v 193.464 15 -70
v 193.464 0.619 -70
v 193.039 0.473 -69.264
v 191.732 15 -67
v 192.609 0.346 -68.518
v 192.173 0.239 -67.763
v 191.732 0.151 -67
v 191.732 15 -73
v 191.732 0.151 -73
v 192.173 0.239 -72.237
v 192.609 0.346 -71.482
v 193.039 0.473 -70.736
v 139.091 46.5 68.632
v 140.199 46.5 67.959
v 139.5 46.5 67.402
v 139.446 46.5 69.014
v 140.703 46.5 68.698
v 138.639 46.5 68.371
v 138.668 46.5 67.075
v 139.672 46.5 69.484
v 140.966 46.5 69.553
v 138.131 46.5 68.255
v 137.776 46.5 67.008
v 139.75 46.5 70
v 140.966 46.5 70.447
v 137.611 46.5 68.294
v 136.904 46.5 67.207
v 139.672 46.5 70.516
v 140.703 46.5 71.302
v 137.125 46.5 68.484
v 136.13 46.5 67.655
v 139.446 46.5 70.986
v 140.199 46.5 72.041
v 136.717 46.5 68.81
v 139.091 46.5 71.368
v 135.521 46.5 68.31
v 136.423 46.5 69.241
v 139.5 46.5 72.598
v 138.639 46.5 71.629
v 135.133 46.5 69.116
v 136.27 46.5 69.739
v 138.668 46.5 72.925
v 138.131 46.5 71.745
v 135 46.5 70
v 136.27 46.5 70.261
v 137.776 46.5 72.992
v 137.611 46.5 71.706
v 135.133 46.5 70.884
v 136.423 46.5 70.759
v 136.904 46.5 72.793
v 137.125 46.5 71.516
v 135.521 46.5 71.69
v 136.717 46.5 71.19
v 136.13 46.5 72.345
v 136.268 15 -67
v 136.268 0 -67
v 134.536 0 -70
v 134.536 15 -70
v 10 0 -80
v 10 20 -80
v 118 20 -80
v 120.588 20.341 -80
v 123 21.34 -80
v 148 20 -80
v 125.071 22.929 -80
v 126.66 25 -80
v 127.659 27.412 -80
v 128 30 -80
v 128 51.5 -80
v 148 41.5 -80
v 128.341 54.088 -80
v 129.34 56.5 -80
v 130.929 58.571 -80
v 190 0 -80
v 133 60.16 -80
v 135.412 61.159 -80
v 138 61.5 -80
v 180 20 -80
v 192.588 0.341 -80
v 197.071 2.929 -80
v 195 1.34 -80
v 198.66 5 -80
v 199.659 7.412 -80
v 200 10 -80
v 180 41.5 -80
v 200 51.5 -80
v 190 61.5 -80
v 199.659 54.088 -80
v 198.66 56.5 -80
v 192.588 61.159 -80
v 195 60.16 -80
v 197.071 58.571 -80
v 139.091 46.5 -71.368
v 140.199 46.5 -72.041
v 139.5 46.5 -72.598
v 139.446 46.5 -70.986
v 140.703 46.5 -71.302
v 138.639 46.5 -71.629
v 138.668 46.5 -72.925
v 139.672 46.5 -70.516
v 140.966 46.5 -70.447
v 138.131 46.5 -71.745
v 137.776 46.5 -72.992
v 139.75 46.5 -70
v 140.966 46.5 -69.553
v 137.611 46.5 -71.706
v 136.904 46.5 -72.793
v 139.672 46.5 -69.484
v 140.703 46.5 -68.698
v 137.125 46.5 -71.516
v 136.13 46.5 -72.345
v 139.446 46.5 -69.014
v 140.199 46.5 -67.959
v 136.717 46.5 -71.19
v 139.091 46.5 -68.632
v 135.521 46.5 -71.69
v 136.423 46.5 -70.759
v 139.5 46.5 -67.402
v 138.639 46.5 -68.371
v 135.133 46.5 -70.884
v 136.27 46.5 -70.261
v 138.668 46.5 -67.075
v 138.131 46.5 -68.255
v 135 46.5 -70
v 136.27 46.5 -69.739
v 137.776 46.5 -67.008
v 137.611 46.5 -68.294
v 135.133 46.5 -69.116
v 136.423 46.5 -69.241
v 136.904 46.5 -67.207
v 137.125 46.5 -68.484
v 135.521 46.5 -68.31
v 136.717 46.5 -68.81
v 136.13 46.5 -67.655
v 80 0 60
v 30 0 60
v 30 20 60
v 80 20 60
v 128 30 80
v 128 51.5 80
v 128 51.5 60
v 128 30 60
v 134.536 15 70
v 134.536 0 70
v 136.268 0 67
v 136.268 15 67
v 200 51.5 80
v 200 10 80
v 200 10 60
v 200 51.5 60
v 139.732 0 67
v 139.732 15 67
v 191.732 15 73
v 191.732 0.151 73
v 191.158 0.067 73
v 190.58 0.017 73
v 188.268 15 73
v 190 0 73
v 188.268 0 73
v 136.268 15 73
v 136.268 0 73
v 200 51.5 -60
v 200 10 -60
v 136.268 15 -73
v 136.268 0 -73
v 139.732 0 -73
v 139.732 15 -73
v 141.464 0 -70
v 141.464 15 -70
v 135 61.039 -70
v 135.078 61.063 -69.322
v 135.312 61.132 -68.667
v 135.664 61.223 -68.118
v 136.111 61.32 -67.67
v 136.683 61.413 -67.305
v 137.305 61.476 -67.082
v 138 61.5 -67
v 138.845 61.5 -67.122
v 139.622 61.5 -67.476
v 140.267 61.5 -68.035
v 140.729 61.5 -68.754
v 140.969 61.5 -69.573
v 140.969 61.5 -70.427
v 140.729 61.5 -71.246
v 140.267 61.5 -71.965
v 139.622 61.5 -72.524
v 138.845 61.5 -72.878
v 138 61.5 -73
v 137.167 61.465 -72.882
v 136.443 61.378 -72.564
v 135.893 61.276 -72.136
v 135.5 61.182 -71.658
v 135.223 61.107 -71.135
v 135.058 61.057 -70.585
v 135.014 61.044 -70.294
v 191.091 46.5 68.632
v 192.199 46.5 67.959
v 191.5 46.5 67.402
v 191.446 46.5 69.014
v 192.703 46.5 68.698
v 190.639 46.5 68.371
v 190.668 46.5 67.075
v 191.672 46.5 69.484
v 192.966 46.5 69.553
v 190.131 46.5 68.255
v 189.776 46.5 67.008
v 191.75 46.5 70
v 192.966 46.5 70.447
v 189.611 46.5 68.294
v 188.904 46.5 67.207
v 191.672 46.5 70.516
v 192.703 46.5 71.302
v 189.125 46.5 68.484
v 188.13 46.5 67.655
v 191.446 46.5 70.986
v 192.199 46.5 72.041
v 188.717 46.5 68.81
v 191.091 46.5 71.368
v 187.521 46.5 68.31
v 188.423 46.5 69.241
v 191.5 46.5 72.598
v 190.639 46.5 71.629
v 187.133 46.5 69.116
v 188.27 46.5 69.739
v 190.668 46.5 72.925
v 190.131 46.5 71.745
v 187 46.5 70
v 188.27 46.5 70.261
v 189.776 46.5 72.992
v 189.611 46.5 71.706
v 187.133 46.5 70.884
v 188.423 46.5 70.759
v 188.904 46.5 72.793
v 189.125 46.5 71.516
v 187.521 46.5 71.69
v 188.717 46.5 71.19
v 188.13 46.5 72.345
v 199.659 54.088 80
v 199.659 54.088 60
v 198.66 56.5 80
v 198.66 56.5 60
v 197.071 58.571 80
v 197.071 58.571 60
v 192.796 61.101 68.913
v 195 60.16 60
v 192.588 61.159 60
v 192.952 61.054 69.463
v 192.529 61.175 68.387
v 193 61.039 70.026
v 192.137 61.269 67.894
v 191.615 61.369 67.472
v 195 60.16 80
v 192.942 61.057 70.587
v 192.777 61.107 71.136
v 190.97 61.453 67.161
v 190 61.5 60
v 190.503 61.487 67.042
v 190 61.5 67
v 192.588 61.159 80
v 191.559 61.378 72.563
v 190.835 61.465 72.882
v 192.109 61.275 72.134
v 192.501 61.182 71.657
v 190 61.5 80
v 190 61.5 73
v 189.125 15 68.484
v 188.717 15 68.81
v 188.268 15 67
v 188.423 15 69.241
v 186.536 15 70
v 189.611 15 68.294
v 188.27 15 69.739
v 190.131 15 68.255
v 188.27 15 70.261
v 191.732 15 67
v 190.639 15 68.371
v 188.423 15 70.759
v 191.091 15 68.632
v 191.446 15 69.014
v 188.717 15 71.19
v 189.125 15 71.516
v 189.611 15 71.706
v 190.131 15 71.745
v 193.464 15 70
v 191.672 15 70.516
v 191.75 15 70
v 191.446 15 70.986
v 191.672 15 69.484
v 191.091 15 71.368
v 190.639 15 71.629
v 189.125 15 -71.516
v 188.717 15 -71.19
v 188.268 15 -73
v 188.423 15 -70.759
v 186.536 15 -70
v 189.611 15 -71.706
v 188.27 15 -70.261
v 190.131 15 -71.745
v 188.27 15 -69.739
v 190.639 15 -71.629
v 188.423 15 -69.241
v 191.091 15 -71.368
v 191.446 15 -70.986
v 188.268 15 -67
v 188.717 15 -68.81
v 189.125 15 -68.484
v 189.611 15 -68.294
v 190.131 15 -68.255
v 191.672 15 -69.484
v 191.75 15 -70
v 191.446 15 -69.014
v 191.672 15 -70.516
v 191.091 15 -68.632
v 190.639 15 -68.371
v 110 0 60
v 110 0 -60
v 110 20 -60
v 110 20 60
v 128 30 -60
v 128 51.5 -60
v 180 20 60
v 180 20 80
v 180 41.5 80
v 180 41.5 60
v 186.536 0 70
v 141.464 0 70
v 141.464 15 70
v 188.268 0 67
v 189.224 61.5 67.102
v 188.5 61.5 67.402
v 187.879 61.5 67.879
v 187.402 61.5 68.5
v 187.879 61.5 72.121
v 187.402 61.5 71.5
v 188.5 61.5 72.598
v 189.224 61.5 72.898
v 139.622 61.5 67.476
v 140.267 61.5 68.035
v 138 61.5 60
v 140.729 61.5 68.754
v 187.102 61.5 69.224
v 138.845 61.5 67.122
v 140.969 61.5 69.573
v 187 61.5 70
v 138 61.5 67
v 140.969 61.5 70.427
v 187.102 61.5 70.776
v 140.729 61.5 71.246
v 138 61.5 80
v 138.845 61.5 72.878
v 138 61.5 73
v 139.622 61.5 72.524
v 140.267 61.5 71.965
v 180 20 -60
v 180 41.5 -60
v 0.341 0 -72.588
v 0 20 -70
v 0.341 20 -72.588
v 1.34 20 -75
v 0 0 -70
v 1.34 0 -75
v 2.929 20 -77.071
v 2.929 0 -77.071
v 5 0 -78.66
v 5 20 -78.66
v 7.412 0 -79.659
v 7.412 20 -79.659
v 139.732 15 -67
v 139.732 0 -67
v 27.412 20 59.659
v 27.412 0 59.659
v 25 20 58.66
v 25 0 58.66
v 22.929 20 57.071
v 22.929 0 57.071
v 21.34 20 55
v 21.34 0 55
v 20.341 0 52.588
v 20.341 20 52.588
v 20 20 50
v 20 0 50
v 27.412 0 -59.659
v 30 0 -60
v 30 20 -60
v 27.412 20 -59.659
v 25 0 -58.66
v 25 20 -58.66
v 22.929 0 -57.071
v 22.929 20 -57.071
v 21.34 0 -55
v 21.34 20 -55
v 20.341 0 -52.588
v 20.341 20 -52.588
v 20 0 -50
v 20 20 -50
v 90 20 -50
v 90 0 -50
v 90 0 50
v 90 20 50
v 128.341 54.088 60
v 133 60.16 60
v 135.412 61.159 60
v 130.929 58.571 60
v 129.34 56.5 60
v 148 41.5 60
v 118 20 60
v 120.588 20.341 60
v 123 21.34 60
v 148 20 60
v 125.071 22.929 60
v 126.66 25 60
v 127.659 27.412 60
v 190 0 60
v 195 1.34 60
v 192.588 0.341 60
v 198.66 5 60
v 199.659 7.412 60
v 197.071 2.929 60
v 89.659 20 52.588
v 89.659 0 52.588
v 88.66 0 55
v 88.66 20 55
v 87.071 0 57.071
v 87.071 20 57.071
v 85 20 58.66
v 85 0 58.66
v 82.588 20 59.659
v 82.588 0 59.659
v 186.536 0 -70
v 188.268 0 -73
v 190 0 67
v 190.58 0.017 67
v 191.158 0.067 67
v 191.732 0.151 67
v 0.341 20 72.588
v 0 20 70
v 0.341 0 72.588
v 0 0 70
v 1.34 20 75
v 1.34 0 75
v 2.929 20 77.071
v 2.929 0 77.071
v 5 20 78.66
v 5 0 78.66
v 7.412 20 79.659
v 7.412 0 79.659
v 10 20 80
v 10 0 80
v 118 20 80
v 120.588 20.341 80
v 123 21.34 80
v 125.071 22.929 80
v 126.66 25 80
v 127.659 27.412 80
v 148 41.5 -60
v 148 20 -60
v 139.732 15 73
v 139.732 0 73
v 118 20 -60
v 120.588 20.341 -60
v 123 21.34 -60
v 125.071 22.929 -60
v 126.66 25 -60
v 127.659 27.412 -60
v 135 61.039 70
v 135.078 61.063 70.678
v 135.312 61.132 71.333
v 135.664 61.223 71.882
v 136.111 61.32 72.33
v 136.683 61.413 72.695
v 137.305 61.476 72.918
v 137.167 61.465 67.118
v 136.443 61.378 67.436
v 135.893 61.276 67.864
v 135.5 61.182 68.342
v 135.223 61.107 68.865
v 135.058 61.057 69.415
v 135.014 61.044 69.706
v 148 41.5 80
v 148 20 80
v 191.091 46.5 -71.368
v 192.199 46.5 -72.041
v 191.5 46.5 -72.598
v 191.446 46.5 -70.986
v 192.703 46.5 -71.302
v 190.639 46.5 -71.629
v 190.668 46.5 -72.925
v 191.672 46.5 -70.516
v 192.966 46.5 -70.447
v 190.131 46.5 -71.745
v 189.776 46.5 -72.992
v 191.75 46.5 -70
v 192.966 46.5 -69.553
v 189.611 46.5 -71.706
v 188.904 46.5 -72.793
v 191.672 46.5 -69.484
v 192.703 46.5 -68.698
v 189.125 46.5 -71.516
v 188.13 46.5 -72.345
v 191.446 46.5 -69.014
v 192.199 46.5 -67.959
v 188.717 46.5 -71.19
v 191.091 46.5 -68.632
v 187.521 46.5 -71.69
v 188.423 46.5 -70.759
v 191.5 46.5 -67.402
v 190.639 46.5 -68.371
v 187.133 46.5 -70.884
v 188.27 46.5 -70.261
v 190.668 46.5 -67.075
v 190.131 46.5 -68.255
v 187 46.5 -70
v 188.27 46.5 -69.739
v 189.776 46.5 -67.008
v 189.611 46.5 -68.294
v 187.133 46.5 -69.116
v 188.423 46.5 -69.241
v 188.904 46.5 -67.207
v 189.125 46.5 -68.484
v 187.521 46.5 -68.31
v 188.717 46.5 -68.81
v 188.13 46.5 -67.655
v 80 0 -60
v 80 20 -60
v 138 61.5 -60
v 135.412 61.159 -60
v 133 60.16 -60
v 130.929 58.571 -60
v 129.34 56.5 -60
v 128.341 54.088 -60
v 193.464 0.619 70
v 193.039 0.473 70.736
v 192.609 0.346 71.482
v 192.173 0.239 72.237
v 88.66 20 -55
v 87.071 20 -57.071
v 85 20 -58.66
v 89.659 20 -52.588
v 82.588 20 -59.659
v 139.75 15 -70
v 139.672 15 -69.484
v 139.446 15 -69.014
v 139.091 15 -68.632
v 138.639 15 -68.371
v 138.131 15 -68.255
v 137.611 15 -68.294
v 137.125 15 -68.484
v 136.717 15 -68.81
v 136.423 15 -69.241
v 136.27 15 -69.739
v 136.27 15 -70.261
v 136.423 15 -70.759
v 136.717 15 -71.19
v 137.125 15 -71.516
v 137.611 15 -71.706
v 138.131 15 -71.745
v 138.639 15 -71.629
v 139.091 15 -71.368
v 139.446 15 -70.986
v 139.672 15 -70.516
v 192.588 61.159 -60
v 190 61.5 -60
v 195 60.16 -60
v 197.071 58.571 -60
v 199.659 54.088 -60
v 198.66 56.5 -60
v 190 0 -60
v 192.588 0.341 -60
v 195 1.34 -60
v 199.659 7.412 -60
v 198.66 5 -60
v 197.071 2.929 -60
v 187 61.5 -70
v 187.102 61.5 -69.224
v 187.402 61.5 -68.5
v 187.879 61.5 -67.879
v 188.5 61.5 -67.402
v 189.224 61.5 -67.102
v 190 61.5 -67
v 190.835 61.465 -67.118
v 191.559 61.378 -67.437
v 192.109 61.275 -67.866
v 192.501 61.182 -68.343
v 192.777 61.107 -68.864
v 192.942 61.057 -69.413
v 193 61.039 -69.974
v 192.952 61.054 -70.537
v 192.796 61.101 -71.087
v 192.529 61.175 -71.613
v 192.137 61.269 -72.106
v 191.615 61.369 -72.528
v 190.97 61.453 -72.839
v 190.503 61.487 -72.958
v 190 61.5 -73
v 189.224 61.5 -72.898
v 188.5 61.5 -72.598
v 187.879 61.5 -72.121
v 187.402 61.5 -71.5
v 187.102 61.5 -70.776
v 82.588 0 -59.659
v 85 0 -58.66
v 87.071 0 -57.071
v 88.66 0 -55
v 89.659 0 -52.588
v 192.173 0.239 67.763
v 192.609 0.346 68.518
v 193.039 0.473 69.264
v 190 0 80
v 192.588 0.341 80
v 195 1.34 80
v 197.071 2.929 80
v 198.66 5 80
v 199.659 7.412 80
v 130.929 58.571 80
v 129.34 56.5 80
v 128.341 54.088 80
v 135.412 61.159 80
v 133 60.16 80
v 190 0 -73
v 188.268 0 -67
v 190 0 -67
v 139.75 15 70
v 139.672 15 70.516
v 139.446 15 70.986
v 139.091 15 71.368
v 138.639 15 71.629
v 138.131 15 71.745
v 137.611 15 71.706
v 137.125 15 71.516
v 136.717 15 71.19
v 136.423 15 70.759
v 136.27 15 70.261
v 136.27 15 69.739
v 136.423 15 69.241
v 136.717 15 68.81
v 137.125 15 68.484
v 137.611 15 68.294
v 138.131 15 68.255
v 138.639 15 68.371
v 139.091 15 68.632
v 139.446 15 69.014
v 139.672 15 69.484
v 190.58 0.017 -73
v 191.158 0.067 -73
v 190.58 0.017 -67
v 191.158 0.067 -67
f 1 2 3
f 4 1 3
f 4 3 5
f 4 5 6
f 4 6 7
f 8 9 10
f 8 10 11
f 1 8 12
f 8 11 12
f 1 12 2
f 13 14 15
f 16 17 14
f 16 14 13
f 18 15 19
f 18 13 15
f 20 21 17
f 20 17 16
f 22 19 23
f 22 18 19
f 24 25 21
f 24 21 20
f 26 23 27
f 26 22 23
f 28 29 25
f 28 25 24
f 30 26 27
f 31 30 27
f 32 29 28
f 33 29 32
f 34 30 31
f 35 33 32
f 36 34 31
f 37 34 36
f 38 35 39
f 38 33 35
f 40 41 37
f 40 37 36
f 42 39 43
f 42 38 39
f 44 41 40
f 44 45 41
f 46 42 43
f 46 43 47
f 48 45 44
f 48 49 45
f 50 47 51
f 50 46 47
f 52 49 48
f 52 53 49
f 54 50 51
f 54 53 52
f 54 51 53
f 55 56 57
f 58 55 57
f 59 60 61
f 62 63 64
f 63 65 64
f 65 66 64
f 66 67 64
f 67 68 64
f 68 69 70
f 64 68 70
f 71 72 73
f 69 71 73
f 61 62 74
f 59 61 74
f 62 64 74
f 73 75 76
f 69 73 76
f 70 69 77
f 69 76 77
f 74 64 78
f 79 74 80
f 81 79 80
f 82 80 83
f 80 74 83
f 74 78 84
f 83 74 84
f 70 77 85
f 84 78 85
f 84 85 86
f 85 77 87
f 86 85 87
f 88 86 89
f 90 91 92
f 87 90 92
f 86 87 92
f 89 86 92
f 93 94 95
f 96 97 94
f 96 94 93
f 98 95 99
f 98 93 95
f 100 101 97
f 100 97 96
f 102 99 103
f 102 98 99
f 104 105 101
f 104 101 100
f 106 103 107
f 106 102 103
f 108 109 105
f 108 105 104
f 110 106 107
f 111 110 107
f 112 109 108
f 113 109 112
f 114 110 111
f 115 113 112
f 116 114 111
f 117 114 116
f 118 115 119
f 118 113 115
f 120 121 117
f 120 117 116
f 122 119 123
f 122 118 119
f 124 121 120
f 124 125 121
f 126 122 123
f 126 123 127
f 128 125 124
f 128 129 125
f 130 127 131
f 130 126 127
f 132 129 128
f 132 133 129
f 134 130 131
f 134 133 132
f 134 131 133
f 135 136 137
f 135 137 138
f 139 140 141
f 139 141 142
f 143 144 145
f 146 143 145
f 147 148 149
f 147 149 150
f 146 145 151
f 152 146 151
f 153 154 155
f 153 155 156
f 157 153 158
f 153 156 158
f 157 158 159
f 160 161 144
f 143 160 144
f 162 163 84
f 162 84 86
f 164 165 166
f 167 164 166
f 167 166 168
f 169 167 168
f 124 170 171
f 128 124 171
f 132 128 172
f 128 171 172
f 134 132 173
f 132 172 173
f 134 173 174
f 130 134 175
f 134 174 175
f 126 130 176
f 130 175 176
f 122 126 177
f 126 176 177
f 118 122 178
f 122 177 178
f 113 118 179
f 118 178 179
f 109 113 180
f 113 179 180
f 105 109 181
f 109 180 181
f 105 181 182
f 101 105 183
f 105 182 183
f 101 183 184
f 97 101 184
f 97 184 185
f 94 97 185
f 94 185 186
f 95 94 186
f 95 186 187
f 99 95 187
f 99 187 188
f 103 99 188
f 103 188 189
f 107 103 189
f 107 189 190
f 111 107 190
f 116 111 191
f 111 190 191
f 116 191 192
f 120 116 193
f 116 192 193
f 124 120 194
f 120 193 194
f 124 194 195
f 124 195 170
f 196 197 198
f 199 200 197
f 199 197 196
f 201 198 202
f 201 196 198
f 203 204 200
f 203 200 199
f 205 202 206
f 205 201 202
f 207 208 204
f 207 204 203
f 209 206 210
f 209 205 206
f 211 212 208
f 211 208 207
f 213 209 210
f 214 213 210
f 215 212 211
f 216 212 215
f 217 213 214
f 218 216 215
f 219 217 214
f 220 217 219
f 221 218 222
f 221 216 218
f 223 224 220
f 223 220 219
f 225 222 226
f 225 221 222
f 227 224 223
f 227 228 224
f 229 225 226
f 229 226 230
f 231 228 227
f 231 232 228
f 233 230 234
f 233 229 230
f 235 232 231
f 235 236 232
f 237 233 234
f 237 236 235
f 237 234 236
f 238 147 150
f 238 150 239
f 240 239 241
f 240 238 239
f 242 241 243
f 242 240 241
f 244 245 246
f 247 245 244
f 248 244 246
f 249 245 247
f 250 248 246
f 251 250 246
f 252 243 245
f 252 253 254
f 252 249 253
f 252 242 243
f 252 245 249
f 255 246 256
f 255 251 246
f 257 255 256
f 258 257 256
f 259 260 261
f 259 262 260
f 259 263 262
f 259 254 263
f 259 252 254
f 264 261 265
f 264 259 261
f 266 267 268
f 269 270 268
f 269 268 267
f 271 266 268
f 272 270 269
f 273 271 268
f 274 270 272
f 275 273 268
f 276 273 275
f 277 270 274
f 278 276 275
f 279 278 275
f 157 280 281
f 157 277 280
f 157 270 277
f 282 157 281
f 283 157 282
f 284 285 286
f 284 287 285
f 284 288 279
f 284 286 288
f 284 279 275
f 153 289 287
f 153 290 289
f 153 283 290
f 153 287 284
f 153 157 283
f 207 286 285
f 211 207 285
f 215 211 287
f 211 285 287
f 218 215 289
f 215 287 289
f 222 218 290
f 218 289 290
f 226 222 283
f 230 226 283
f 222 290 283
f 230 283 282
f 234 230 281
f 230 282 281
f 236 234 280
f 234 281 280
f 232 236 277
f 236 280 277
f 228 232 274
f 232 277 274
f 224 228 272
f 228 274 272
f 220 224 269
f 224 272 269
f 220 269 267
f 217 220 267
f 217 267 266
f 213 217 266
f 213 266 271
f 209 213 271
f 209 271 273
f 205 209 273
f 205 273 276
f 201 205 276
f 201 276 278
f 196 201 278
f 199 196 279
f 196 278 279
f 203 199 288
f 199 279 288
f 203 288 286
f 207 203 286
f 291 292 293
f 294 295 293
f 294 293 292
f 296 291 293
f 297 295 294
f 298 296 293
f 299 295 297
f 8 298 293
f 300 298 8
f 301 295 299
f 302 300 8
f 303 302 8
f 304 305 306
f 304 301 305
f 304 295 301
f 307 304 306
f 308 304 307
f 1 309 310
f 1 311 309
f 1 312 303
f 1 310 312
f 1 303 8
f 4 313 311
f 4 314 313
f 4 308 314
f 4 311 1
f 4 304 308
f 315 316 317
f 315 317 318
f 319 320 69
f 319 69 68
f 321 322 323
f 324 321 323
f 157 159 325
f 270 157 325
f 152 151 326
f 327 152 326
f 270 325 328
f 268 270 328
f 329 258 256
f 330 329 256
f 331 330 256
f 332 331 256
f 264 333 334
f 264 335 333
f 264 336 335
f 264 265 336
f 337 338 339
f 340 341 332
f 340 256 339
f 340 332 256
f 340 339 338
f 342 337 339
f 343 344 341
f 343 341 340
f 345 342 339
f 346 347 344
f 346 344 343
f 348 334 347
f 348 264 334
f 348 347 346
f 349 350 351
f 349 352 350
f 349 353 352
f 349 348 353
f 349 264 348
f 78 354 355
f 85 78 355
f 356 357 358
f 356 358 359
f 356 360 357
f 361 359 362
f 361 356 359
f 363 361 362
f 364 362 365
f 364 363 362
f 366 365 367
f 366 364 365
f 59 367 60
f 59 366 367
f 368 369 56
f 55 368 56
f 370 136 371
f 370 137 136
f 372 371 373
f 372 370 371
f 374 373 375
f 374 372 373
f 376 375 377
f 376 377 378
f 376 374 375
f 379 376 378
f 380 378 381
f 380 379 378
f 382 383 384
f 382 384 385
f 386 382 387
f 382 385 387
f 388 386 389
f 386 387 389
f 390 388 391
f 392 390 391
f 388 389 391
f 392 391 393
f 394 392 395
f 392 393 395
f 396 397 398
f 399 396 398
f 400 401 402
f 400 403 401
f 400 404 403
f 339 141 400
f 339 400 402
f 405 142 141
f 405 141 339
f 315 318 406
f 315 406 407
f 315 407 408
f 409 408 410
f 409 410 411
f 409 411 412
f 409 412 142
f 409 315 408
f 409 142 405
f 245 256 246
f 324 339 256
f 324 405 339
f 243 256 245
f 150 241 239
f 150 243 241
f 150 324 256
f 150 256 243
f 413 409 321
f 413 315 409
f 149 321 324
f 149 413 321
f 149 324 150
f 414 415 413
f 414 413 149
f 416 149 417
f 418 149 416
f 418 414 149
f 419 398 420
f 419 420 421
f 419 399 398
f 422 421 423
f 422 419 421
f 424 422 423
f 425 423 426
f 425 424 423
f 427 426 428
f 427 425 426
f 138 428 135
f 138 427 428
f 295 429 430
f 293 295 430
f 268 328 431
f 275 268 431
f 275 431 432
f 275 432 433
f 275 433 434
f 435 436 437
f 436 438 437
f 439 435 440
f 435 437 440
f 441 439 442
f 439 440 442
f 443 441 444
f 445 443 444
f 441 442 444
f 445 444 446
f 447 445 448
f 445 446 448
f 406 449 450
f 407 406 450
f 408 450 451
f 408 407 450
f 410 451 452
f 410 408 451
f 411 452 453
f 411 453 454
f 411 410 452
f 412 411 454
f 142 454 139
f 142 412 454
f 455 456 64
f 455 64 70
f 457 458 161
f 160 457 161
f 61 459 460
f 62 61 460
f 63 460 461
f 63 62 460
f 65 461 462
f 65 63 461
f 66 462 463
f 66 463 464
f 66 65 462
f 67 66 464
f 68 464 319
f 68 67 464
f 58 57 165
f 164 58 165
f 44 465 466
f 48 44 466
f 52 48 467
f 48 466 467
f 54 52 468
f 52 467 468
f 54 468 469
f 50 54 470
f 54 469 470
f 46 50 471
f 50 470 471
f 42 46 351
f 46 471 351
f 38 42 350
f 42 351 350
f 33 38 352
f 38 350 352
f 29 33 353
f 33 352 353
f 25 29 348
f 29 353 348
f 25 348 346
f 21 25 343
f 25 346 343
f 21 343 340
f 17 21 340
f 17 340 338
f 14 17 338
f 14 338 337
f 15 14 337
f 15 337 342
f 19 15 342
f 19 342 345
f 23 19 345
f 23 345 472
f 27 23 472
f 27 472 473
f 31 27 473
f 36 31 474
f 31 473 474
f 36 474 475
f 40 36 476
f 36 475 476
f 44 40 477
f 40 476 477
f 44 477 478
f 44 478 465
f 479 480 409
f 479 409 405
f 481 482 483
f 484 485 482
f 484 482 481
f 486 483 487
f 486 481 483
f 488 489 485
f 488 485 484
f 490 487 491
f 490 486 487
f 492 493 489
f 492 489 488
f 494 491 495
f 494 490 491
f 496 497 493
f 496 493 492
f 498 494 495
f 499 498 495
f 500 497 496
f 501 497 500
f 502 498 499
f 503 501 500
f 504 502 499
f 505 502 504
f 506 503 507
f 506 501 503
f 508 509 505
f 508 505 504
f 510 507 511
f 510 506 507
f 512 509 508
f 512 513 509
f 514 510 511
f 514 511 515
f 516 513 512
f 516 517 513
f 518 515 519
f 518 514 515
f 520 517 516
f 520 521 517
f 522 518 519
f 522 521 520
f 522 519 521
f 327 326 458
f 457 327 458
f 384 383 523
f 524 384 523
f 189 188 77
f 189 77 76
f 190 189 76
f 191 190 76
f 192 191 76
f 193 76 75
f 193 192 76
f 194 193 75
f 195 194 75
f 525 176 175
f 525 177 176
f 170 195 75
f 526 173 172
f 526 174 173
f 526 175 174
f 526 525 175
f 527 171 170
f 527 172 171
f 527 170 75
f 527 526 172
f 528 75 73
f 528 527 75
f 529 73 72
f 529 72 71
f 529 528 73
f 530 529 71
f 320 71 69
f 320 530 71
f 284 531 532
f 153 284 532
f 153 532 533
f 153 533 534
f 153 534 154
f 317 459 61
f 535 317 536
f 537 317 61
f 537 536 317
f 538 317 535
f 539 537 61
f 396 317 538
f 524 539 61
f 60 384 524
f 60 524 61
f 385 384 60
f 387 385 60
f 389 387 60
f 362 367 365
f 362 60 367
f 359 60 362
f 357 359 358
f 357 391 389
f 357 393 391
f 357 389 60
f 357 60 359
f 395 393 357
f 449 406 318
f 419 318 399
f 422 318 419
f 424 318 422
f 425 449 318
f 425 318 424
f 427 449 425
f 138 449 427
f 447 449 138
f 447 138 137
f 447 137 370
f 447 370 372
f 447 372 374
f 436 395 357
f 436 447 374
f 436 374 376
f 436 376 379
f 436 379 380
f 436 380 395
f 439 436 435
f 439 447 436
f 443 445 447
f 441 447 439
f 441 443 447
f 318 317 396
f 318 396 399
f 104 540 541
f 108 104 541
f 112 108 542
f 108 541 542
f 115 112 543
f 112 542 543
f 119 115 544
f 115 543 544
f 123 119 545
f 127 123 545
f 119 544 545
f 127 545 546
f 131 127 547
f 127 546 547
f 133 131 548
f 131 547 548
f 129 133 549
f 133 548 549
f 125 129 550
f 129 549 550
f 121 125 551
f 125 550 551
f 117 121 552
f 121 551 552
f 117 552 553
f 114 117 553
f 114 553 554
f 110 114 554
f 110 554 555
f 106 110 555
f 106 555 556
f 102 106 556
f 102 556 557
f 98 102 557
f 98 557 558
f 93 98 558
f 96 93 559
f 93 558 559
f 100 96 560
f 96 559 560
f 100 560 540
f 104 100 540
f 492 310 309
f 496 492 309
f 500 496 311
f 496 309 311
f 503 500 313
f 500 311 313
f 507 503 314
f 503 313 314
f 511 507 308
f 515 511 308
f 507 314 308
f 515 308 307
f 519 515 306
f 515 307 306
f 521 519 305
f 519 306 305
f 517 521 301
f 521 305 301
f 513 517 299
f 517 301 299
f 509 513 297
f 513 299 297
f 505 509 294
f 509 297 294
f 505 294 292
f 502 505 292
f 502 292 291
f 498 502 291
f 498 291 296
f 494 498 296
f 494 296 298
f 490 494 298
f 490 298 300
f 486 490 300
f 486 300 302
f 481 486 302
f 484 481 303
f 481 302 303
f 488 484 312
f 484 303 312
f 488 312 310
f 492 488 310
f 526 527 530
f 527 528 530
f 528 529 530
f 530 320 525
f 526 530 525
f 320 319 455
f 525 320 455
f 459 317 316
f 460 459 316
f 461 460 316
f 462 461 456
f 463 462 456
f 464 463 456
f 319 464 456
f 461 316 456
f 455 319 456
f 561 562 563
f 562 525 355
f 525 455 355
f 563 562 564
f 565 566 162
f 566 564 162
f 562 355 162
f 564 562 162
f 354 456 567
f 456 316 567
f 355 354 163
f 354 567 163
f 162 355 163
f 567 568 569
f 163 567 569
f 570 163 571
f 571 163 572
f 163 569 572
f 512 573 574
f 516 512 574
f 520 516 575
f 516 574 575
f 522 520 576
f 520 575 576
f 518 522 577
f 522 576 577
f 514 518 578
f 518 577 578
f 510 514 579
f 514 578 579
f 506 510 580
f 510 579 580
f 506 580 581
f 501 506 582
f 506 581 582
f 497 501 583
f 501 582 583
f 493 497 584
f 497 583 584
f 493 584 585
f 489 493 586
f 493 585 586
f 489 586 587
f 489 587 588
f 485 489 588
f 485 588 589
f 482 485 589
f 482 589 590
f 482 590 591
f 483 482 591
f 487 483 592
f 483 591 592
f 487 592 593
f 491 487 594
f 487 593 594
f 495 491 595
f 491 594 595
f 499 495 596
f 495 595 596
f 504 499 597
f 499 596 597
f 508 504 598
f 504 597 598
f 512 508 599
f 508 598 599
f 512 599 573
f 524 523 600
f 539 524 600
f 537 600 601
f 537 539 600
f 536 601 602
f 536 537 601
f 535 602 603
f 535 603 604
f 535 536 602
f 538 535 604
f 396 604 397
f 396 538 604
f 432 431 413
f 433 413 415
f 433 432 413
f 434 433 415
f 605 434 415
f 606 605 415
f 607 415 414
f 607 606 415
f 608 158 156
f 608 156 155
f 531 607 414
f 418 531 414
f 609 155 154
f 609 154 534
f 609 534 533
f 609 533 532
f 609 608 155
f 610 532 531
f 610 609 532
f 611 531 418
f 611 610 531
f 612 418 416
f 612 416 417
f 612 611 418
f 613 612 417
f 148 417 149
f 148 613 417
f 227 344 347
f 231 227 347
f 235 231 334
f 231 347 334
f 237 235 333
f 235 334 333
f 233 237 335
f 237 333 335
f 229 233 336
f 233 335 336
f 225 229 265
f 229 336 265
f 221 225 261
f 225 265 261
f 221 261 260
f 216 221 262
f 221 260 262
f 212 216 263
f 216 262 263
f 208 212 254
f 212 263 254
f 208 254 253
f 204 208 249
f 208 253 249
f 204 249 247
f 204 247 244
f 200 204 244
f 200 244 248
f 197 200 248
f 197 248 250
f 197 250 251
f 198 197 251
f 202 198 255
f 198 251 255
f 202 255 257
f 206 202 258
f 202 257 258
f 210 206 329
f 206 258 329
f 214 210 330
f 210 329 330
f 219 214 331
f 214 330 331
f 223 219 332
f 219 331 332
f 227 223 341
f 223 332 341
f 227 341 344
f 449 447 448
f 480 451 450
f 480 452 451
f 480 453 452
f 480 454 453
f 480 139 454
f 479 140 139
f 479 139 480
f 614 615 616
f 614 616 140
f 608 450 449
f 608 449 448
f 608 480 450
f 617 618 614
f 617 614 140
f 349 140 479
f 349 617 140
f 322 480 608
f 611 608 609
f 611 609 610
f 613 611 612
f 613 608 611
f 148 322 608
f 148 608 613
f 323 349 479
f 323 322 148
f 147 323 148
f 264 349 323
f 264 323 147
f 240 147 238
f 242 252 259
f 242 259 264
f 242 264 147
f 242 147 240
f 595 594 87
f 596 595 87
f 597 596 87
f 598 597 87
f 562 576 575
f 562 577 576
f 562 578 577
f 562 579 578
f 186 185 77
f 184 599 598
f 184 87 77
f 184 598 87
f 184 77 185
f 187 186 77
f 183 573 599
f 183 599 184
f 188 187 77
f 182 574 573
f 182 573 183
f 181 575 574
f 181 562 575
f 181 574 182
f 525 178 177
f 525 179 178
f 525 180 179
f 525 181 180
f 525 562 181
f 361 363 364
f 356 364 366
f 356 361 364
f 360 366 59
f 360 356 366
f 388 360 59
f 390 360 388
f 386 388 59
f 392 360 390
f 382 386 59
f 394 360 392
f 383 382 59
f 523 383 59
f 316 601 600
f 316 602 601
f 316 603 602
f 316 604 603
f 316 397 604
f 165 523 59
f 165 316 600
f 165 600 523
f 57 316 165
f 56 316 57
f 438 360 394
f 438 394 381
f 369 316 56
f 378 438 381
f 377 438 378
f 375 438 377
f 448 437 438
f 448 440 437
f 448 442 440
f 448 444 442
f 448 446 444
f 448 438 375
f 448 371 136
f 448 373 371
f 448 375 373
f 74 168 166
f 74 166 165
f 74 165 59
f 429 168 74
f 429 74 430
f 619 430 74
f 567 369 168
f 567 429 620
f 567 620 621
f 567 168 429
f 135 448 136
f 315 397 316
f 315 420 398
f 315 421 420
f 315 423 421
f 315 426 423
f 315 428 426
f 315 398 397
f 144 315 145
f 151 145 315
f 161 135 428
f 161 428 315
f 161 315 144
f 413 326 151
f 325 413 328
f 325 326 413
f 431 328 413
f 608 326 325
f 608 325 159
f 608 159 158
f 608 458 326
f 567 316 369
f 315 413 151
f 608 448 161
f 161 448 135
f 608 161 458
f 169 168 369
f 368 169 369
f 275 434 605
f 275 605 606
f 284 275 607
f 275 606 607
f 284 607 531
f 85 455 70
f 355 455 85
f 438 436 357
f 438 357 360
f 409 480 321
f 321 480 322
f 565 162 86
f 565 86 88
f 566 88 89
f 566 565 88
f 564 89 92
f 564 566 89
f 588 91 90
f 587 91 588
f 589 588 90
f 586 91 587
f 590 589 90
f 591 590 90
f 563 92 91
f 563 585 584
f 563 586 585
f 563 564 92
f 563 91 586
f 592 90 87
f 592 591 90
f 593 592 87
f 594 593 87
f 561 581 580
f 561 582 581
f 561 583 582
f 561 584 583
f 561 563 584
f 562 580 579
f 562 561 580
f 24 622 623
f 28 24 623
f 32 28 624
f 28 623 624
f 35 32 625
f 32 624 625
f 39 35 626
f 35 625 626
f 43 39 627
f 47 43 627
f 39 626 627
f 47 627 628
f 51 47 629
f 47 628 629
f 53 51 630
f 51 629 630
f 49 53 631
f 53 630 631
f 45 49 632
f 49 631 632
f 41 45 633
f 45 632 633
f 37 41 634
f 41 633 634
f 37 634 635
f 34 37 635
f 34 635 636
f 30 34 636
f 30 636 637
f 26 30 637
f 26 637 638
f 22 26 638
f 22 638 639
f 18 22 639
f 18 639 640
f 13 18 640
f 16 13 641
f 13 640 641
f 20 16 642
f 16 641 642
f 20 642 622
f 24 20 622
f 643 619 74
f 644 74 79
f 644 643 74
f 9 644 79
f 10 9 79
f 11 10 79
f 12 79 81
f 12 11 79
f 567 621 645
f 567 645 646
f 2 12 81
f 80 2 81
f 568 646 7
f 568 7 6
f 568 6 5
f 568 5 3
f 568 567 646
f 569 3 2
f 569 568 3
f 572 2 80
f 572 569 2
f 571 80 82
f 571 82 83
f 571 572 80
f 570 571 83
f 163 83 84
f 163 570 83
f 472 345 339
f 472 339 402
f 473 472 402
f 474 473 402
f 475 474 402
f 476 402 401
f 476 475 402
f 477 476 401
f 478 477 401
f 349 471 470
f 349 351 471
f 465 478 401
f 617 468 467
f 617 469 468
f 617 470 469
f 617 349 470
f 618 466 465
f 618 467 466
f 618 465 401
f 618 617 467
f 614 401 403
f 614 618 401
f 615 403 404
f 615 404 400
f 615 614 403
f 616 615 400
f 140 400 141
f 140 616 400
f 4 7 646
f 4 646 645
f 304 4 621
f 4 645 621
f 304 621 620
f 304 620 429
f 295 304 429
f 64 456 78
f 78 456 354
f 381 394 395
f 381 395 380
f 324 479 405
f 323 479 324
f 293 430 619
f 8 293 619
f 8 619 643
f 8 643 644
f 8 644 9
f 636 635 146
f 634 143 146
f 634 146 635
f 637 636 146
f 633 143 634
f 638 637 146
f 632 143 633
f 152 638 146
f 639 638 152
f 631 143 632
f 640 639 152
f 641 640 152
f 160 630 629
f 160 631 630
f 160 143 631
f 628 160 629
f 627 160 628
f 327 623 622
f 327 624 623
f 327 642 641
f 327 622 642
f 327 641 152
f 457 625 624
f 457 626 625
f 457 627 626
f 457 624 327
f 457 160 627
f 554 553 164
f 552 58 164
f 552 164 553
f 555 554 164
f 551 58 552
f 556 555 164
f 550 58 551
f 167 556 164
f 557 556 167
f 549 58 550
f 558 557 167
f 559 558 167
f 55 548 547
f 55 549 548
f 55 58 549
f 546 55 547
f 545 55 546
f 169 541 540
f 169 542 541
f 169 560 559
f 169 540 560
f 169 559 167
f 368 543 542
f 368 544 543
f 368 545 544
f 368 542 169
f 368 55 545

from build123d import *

# Parameters (mm, degrees)
SKETCH_W         = 32
SKETCH_H         = 21.5
PAD_DEPTH        = 80
SKETCH001_W      = 70
SKETCH001_H      = 120
SKETCH001_W_2    = 140
POCKET_DEPTH     = 61.501
FILLET_R         = 10
HOLE_D           = 3.5
HOLE_CBORE_D     = 6
HOLE_CBORE_DEPTH = 15
POCKET001_DEPTH  = 15


with BuildPart() as part:
    # Sketch → Pad (new body, symmetric)
    with BuildSketch(Plane.XY):
        Polygon((0, 0), (200, 0), (200, 61.5), (128, 61.5), (128, 20), (0, 20), align=None)
        with Locations((164, 30.75)):
            Rectangle(SKETCH_W, SKETCH_H, mode=Mode.SUBTRACT)
    extrude(amount=PAD_DEPTH, both=True)

    # Sketch001 → Pocket (cut, through all)
    with BuildSketch(Plane.XZ):
        with Locations((55, 0)):
            Rectangle(SKETCH001_W, SKETCH001_H)
        with Locations((180, 0)):
            Rectangle(SKETCH001_W_2, SKETCH001_H)
    extrude(amount=-POCKET_DEPTH, mode=Mode.SUBTRACT)

    # Fillet
    fillet_edges = [part.edges().sort_by_distance(p)[0] for p in [
        (20, 10, -60),
        (0, 10, 80),
        (20, 10, 60),
        (0, 10, -80),
        (200, 0, 70),
        (200, 61.5, 70),
        (200, 61.5, -70),
        (200, 0, -70),
        (128, 61.5, 70),
        (128, 61.5, -70),
        (128, 20, 70),
        (128, 20, -70),
        (90, 10, 60),
        (90, 10, -60),
    ]]
    fillet(fillet_edges, radius=FILLET_R)

    # Hole (through all)
    with Locations(Plane(origin=(0, 61.5, 0), x_dir=(-1, 0, 0), z_dir=(0, 1, 0))):
        with Locations((-190, 70), (-138, 70), (-190, -70), (-138, -70)):
            CounterBoreHole(HOLE_D / 2, HOLE_CBORE_D / 2, HOLE_CBORE_DEPTH)

    # Sketch004 → Pocket001 (cut)
    with BuildSketch(Plane.XZ):
        Polygon((141.464102, -70), (139.732051, -67), (136.267949, -67), (134.535898, -70), (136.267949, -73), (139.732051, -73), align=None)
        Polygon((188.267949, -73), (191.732051, -73), (193.464102, -70), (191.732051, -67), (188.267949, -67), (186.535898, -70), align=None)
        Polygon((139.732051, 67), (141.464102, 70), (139.732051, 73), (136.267949, 73), (134.535898, 70), (136.267949, 67), align=None)
        Polygon((188.267949, 67), (191.732051, 67), (193.464102, 70), (191.732051, 73), (188.267949, 73), (186.535898, 70), align=None)
    extrude(amount=-POCKET001_DEPTH, mode=Mode.SUBTRACT)


solid = part.part
